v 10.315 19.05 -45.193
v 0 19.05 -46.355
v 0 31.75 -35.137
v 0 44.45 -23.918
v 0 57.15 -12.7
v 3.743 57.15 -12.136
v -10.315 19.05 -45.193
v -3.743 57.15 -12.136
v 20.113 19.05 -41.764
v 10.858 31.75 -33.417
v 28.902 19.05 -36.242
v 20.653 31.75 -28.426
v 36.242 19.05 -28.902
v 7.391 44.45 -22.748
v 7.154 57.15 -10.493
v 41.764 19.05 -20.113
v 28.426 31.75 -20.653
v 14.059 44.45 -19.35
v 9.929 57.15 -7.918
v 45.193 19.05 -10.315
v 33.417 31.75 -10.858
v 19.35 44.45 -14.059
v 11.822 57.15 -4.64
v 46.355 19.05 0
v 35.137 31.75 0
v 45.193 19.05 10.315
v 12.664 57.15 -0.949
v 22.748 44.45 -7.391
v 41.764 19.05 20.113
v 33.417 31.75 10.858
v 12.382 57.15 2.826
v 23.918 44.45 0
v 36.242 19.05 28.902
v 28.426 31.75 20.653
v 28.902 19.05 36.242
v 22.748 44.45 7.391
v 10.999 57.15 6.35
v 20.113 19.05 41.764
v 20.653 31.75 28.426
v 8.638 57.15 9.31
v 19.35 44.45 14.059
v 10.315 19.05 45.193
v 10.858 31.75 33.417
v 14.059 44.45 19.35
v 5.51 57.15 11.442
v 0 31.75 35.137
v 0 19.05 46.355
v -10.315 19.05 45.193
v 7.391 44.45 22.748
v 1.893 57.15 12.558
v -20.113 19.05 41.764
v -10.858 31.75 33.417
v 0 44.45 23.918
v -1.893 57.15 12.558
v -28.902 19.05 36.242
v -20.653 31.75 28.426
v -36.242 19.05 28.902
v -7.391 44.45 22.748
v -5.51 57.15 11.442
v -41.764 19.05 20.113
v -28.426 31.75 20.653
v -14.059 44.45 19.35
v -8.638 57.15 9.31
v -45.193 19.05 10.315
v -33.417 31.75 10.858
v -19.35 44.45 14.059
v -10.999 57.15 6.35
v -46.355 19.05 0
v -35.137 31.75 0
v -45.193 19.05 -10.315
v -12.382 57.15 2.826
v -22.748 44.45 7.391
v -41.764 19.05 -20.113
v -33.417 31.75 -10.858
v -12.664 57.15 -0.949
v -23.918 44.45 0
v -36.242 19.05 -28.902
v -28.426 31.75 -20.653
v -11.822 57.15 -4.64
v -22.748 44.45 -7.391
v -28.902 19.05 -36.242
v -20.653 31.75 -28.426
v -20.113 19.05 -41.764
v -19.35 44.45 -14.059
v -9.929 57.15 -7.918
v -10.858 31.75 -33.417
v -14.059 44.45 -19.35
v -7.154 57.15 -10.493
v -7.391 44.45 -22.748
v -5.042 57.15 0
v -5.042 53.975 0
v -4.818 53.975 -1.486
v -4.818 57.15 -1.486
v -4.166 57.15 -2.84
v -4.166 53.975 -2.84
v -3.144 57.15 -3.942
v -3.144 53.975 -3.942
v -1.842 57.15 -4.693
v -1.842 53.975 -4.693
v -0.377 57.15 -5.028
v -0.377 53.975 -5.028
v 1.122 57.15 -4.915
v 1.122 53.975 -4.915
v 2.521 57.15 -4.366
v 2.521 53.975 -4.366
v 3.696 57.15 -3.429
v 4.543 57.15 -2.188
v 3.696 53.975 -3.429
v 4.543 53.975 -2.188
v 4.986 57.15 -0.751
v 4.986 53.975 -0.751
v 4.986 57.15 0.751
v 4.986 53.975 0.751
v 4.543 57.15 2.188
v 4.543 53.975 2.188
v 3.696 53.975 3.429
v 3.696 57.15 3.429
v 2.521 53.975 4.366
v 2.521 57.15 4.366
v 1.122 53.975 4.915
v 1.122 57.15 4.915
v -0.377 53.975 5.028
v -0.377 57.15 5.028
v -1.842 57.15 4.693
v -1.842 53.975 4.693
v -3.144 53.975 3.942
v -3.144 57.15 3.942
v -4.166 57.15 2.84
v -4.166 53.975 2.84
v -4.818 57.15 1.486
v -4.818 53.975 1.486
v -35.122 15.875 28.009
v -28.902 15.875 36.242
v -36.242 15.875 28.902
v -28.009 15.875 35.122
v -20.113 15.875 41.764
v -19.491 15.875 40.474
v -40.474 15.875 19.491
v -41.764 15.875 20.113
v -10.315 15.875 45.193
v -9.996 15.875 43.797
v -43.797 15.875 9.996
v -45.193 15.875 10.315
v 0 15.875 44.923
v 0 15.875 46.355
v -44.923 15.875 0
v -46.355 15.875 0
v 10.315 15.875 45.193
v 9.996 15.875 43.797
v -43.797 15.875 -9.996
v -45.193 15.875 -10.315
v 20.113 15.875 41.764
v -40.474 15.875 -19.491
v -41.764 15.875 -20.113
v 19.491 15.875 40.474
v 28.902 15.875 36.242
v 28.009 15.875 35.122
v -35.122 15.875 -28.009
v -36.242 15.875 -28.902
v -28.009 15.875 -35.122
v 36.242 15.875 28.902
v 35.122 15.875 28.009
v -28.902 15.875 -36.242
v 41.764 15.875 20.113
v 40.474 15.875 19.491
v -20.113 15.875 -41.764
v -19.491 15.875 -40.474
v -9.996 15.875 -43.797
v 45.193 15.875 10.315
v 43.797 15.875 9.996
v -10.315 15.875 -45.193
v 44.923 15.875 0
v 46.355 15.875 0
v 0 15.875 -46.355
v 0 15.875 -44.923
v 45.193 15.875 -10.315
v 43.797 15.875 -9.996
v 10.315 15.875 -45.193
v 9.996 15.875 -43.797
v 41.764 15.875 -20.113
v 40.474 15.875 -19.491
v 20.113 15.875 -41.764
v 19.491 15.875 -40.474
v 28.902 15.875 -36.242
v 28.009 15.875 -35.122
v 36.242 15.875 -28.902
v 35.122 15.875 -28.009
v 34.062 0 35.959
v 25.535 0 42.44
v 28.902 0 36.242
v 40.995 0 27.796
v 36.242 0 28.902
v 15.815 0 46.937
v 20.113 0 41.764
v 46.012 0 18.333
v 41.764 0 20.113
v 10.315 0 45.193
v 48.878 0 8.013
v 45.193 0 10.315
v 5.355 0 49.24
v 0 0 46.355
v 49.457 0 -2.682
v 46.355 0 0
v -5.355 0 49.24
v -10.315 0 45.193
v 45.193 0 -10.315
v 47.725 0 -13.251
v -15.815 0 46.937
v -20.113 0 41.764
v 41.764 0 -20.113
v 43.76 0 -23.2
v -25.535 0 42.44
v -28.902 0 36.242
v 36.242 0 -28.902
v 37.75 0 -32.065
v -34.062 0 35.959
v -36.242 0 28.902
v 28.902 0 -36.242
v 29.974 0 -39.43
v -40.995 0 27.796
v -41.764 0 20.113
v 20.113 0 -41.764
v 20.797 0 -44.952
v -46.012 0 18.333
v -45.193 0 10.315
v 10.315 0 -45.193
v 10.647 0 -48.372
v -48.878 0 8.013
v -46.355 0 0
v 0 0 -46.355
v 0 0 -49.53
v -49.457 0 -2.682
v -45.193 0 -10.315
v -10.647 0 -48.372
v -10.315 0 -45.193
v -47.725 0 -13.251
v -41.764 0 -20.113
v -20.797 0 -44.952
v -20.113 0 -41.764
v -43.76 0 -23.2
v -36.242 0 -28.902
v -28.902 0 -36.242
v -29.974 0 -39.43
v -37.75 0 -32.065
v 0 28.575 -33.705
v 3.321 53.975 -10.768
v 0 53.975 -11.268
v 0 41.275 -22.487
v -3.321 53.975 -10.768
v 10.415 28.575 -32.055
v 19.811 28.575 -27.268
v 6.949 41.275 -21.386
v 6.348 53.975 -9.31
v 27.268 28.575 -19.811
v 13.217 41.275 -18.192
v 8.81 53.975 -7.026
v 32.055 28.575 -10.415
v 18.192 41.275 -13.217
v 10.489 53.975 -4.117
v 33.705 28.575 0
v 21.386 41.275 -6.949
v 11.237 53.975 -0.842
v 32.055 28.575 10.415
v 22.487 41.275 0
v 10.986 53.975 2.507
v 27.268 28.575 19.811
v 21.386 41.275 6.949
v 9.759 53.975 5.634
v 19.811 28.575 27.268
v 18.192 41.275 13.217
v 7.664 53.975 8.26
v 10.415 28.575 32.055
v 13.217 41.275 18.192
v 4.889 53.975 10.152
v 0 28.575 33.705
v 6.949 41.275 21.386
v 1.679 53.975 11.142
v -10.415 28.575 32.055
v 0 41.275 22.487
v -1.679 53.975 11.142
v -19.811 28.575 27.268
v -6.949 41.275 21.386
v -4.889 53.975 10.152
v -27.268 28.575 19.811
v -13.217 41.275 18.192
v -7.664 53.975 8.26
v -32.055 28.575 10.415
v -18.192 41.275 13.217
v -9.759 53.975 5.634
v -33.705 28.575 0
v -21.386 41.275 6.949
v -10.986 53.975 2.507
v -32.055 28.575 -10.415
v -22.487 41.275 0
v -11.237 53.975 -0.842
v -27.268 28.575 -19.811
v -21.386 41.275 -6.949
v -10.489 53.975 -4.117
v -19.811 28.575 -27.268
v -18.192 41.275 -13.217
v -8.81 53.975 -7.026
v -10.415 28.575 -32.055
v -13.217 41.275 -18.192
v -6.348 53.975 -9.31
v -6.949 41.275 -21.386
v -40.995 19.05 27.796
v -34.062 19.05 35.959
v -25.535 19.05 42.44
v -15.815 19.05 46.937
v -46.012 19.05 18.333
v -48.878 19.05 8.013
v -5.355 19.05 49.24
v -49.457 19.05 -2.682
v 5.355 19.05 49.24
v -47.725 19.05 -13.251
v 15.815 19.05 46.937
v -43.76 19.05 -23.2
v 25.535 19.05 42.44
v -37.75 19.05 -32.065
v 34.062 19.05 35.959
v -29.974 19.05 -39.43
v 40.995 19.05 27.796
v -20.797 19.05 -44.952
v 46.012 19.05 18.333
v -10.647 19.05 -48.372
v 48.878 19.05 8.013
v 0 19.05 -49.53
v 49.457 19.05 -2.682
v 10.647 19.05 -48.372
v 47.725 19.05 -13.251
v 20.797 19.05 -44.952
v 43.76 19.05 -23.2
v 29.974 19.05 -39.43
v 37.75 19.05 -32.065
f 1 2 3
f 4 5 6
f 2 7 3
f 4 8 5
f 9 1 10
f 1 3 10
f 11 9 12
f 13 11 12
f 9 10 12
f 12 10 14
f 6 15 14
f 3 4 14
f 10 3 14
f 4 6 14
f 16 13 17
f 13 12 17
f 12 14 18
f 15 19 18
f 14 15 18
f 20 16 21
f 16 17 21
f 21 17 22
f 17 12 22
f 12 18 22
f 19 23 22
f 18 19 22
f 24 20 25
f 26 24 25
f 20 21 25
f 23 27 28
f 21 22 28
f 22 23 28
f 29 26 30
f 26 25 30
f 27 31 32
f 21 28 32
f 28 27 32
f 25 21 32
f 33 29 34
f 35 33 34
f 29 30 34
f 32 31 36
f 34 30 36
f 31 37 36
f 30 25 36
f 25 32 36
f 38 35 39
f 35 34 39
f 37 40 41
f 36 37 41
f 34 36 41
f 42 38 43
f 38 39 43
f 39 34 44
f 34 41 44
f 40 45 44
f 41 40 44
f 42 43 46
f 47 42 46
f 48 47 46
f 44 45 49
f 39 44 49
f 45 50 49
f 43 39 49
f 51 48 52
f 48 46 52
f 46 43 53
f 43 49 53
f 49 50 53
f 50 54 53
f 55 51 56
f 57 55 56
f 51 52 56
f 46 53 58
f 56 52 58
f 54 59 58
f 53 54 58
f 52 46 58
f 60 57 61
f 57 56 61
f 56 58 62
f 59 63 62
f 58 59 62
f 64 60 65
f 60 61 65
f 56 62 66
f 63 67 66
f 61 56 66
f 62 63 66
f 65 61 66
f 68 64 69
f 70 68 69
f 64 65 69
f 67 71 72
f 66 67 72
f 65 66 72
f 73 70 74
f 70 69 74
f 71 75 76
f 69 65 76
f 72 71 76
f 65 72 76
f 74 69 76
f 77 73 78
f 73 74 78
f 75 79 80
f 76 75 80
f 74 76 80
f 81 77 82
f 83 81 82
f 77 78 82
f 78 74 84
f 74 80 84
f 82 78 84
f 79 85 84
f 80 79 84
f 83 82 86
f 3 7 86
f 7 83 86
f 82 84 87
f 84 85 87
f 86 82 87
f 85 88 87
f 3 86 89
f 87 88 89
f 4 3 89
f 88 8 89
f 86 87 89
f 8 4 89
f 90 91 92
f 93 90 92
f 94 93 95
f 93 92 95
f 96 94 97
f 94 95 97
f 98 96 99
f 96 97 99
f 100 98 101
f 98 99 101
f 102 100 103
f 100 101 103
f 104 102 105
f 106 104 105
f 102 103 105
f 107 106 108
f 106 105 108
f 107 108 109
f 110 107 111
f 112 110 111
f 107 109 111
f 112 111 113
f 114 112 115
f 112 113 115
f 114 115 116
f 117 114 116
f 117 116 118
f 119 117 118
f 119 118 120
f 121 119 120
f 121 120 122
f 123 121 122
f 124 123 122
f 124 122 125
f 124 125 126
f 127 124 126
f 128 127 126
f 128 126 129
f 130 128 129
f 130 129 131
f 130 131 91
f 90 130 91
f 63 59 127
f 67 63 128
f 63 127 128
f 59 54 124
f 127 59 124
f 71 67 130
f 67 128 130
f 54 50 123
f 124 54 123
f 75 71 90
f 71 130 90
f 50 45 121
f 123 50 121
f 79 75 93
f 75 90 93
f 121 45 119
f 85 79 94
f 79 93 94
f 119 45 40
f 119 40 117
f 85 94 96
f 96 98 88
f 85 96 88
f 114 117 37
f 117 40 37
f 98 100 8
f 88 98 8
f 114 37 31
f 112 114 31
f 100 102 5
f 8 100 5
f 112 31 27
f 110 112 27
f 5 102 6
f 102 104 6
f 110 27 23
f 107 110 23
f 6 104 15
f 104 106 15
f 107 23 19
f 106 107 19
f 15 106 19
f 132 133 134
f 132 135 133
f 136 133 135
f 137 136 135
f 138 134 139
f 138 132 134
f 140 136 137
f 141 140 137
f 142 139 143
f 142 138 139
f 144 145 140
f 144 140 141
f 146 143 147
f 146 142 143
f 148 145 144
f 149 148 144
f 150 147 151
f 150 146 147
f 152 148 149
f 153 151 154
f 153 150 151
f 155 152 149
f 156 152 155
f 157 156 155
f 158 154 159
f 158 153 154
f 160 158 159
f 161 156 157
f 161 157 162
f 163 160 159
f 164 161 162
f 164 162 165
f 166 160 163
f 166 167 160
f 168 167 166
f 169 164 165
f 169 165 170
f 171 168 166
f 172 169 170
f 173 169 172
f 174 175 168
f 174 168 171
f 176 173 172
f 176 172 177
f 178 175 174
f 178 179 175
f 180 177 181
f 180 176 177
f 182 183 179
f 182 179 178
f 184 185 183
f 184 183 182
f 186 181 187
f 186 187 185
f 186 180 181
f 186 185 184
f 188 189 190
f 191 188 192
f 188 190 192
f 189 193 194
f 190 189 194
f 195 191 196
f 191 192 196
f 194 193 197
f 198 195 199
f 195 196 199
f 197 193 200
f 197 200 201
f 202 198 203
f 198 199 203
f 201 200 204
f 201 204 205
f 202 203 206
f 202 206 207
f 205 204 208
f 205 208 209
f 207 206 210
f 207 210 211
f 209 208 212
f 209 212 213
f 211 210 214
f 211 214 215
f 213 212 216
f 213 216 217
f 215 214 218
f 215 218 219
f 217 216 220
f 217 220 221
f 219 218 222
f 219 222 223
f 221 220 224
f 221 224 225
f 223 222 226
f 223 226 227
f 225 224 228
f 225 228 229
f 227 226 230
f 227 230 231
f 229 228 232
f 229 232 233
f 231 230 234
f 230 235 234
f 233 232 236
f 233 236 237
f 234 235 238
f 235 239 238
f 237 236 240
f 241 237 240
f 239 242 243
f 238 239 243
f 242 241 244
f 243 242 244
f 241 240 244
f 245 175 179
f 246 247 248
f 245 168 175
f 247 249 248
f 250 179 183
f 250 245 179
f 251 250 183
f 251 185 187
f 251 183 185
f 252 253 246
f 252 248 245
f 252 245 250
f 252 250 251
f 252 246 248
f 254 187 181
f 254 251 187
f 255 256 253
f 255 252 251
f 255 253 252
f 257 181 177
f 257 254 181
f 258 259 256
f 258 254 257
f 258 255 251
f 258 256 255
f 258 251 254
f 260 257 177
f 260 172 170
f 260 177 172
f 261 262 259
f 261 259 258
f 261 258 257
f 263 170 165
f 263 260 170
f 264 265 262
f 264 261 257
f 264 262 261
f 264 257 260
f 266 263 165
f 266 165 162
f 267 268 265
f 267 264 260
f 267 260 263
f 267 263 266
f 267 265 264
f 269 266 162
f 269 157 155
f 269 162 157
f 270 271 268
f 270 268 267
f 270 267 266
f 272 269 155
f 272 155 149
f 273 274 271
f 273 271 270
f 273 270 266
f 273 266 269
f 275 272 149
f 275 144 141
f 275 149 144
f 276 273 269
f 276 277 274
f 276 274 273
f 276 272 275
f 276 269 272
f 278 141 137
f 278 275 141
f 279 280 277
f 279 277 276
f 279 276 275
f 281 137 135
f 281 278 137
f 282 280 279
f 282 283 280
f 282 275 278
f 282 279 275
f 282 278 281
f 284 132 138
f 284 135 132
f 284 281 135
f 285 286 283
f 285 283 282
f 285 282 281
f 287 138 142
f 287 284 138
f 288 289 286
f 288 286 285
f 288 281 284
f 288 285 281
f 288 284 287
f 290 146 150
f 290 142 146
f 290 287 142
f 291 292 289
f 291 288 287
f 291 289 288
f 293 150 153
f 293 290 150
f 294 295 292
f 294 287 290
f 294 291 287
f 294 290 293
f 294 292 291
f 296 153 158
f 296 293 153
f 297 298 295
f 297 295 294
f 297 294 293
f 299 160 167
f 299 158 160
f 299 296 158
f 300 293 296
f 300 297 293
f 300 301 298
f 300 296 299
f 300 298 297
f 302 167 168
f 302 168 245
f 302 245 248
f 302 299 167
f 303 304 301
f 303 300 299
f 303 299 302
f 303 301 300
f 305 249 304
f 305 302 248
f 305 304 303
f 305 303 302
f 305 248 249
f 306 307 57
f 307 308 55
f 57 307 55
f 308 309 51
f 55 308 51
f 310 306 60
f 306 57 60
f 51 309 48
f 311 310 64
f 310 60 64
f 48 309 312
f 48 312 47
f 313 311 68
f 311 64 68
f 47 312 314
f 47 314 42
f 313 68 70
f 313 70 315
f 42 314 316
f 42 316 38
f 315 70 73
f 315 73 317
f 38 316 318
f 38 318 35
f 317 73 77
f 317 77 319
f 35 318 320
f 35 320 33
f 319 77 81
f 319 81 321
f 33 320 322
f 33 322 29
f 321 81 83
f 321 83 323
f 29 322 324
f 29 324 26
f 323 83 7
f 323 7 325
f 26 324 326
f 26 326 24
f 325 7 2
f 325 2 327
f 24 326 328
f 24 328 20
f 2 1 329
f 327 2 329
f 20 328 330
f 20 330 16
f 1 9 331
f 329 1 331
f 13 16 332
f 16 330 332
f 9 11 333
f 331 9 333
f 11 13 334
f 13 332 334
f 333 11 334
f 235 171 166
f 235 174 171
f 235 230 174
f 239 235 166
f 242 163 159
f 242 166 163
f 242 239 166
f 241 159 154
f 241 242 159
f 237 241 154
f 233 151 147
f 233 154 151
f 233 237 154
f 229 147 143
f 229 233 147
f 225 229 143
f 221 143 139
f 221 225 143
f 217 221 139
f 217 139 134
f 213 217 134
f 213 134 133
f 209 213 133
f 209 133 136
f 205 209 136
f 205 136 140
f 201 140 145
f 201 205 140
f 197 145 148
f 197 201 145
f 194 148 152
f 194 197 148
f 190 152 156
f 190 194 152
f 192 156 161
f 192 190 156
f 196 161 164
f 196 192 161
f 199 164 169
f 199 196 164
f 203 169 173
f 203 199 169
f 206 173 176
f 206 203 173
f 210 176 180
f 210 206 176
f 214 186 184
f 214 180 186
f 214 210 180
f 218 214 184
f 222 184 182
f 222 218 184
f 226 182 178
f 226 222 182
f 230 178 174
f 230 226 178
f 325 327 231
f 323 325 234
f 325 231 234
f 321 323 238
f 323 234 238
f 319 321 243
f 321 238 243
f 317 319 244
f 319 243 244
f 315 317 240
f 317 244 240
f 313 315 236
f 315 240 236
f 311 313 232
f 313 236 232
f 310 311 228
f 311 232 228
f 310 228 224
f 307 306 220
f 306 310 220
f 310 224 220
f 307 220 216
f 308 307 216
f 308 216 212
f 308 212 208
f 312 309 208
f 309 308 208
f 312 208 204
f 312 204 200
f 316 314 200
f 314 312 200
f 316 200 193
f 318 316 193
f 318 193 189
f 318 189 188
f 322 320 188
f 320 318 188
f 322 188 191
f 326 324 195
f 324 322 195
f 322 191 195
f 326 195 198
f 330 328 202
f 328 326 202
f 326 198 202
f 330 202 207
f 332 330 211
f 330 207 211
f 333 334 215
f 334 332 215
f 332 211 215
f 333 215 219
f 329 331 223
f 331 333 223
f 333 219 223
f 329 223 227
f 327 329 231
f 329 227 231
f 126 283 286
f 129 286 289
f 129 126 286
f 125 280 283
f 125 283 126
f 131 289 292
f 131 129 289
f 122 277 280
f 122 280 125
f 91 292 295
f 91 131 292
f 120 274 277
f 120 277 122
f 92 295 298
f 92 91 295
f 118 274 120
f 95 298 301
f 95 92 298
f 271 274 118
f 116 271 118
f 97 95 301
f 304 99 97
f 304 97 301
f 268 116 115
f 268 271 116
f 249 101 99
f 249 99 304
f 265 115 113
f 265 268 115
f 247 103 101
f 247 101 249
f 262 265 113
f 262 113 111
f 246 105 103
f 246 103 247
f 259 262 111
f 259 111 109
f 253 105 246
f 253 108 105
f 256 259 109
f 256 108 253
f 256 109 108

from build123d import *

# Parameters (mm, degrees)
SKETCH1_R                   = 49.53
BOSS_EXTRUDE1_DEPTH         = 76.2
SHELL1_T                    = -3.175
F_3_8_CLEARANCE_HOLE1_D     = 10.0838
F_3_8_CLEARANCE_HOLE1_DEPTH = 25.4
F_3_8_CLEARANCE_HOLE1_TIP   = 3.029479155


with BuildPart() as part:
    # Sketch1 → Boss-Extrude1 (new body)
    with BuildSketch(Plane(origin=(0, 0, 0), x_dir=(1, 0, 0), z_dir=(0, 1, 0))):
        with Locations(Location((0, 0, 0), (0, 0, 90))):
            Circle(SKETCH1_R)
    extrude(amount=BOSS_EXTRUDE1_DEPTH)

    # Sketch8 → Cut-Revolve1 (revolve, cut)
    with BuildSketch(Plane.XY, mode=Mode.PRIVATE) as cut_revolve1_sk:
        Polygon((49.53, 19.05), (46.355, 19.05), (12.7, 57.15), (0, 57.15), (0, 76.2), (49.53, 76.2), align=None)
    revolve(cut_revolve1_sk.sketch.rotate(Axis((0, 76.2, 0), (0, -1, 0)), 270), axis=Axis((0, 76.2, 0), (0, -1, 0)), mode=Mode.SUBTRACT)

    # Shell1
    shell1_openings = [part.faces().sort_by_distance(p)[0] for p in [
        (0, 0, 0),
    ]]
    offset(amount=SHELL1_T, openings=shell1_openings, kind=Kind.INTERSECTION)

    # 3/8 Clearance Hole1
    with Locations(Plane(origin=(0, 57.15, 0), x_dir=(1, 0, 0), z_dir=(0, 1, 0))):
        with Locations((0, 0)):
            Hole(F_3_8_CLEARANCE_HOLE1_D / 2, depth=F_3_8_CLEARANCE_HOLE1_DEPTH)
            with Locations((0, 0, -(F_3_8_CLEARANCE_HOLE1_DEPTH + F_3_8_CLEARANCE_HOLE1_TIP / 2))):  # 118° drill point
                Cone(0, F_3_8_CLEARANCE_HOLE1_D / 2, F_3_8_CLEARANCE_HOLE1_TIP, mode=Mode.SUBTRACT)


solid = part.part
